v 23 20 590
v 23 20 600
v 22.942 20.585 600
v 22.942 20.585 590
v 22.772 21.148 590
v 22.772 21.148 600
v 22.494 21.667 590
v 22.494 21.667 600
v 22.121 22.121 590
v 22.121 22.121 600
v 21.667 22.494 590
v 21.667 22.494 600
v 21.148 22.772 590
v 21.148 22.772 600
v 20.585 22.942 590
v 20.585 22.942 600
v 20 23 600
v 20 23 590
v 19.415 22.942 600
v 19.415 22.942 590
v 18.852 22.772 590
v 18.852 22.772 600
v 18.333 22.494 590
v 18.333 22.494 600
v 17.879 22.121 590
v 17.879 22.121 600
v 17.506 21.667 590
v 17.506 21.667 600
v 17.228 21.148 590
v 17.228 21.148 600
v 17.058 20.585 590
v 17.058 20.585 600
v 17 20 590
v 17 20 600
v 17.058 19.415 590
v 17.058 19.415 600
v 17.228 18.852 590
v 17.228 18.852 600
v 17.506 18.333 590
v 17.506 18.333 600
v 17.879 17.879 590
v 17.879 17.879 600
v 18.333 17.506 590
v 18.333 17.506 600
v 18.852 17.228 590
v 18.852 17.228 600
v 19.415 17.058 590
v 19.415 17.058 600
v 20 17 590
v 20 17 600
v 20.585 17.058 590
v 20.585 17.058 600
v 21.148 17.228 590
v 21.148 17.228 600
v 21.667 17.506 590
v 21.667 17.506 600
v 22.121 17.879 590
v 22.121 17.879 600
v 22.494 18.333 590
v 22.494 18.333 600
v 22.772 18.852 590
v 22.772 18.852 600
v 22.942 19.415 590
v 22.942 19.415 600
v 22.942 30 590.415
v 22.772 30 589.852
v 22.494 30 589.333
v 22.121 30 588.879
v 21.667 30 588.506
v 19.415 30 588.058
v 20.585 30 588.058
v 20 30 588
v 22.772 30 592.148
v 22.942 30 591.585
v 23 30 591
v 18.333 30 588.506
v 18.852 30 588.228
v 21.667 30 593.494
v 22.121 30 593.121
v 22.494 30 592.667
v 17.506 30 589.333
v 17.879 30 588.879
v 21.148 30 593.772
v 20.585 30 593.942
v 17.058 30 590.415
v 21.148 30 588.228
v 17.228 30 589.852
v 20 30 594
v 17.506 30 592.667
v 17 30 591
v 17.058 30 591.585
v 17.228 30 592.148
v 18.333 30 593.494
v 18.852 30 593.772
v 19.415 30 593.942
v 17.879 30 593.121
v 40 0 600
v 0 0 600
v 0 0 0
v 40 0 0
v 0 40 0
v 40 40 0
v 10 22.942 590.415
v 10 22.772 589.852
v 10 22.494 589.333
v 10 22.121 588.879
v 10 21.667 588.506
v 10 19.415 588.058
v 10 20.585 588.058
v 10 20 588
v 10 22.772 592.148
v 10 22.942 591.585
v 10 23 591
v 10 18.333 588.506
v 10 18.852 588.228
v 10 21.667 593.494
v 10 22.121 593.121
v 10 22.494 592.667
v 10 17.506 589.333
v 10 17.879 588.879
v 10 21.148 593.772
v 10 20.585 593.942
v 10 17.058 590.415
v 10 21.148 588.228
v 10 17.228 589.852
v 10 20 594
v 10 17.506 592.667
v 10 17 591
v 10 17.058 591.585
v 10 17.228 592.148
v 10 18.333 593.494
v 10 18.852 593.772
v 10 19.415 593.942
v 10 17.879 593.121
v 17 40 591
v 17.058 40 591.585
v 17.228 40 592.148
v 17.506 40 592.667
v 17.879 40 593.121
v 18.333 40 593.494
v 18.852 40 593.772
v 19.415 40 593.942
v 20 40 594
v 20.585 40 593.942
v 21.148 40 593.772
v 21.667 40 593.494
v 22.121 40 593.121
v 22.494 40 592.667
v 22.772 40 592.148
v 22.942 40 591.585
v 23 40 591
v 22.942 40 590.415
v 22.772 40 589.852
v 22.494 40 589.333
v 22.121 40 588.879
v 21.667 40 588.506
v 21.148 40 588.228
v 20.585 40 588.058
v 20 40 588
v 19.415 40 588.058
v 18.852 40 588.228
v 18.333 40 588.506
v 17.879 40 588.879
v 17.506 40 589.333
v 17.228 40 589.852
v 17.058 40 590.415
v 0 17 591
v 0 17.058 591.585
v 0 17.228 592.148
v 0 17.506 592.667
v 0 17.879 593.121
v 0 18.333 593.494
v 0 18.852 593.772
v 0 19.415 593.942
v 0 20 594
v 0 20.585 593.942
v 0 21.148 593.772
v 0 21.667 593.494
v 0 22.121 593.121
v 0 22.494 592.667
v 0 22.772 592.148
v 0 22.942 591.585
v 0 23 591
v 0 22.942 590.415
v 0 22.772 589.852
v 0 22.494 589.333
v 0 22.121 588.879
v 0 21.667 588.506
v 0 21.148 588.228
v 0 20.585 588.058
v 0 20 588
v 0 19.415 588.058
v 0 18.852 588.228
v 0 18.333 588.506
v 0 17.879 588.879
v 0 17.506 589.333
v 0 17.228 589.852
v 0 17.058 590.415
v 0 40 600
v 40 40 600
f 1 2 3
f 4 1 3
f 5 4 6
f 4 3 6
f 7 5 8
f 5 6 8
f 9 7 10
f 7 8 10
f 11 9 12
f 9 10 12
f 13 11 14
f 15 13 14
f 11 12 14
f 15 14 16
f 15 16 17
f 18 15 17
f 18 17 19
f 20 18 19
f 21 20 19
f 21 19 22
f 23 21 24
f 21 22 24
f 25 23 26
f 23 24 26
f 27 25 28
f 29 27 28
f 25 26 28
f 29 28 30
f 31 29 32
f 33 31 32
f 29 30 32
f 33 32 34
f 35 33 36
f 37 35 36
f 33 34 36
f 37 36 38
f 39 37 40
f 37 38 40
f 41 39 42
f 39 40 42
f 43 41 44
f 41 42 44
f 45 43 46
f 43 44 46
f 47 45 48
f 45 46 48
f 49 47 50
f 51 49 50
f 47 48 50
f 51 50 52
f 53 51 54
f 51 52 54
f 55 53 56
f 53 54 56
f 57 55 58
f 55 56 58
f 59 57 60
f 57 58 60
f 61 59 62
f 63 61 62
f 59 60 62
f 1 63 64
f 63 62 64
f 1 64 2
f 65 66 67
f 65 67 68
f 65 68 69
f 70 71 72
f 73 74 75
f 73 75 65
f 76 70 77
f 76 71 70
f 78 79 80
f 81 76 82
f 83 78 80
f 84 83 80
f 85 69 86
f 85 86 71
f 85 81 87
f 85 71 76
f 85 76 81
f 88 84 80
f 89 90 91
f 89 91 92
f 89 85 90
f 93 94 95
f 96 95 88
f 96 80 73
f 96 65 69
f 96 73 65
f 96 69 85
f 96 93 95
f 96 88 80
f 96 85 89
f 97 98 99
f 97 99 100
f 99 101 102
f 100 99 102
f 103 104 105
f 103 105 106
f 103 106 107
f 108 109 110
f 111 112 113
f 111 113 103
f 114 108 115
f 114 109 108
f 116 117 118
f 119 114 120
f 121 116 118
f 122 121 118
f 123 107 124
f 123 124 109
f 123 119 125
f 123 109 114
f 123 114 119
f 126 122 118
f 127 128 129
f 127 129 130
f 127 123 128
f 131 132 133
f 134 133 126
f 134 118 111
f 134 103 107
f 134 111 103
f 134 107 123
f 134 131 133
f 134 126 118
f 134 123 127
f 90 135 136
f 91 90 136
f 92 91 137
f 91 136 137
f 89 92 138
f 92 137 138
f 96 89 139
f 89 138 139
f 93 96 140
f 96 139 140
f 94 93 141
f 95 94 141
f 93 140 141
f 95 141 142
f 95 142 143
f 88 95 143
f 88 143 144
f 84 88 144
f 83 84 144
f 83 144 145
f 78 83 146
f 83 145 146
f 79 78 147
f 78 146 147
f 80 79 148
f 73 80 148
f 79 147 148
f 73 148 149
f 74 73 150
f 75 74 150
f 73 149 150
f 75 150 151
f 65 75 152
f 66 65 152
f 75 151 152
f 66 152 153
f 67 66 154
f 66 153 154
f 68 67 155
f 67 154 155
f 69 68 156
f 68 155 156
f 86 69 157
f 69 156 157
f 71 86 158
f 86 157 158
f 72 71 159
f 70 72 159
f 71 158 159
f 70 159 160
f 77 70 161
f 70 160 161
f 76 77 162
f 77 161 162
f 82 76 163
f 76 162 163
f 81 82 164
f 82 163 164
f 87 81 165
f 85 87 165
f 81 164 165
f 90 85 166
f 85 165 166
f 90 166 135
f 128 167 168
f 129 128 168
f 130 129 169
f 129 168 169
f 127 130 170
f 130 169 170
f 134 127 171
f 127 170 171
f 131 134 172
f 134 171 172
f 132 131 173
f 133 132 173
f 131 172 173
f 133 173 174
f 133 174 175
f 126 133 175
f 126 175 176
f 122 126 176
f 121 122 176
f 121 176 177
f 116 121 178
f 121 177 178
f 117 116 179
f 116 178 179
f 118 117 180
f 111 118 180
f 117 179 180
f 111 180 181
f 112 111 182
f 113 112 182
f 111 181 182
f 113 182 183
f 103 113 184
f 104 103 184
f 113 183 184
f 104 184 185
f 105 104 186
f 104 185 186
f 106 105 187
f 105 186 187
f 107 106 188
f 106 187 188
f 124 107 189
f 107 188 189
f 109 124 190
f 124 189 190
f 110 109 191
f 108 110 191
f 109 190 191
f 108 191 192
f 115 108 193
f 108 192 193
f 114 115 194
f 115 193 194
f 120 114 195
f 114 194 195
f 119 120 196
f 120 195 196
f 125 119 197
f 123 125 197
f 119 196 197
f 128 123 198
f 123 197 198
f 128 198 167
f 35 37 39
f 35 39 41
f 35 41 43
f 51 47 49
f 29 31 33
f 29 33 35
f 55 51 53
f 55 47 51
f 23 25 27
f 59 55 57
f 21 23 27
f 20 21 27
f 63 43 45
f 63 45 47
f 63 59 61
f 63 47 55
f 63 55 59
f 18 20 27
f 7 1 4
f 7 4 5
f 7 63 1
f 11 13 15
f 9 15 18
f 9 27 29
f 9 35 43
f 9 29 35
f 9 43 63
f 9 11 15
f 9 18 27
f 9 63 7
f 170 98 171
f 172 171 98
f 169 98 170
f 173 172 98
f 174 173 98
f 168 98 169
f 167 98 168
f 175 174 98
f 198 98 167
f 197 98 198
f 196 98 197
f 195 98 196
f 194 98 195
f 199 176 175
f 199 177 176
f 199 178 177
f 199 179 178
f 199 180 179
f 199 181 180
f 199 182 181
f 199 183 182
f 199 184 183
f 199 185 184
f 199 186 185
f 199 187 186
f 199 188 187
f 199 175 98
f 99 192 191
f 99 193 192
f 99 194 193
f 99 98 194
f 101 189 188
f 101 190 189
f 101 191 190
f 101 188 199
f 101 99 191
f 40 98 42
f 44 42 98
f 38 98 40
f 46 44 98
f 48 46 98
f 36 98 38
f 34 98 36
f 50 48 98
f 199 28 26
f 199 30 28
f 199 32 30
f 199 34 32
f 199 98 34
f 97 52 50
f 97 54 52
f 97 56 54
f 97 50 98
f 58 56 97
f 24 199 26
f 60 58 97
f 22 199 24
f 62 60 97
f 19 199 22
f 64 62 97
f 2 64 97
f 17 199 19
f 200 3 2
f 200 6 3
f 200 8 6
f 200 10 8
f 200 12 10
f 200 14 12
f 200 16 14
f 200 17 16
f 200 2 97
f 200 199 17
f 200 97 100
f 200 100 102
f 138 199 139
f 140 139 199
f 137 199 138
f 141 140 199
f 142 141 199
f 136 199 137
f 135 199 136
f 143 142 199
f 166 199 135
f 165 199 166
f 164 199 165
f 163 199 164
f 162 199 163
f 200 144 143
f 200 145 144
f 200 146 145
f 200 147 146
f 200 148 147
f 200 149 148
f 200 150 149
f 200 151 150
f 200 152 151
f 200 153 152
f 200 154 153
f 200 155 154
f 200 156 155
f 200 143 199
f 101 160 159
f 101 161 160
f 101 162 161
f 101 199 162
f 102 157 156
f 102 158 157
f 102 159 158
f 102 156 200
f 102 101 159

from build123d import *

# Parameters (mm, degrees)
F0_W     = 40
F0_H     = 40
F1_DEPTH = 600
F2_R     = 3
F3_DEPTH = 10
F4_R     = 3
F5_DEPTH = 10
F6_R     = 3
F7_DEPTH = 10


with BuildPart() as f1:
    # F0 (on Top) → F1 (new body)
    with BuildSketch(Plane.XY):
        with Locations((20, 20)):
            Rectangle(F0_W, F0_H)
    extrude(amount=F1_DEPTH)

    # F2 (on face) → F3 (cut)
    with BuildSketch(Plane(origin=(0, 0, 0), x_dir=(0, -1, 0), z_dir=(-1, 0, 0))):
        with Locations((-20, 591)):
            Circle(F2_R)
    extrude(amount=-F3_DEPTH, mode=Mode.SUBTRACT)

    # F4 (on face) → F5 (cut)
    with BuildSketch(Plane(origin=(0, 40, 0), x_dir=(-1, 0, 0), z_dir=(0, 1, 0))):
        with Locations((-20, 591)):
            Circle(F4_R)
    extrude(amount=-F5_DEPTH, mode=Mode.SUBTRACT)

    # F6 (on face) → F7 (cut)
    with BuildSketch(Plane.XY.offset(600)):
        with Locations((20, 20)):
            Circle(F6_R)
    extrude(amount=-F7_DEPTH, mode=Mode.SUBTRACT)


solid = f1.part
